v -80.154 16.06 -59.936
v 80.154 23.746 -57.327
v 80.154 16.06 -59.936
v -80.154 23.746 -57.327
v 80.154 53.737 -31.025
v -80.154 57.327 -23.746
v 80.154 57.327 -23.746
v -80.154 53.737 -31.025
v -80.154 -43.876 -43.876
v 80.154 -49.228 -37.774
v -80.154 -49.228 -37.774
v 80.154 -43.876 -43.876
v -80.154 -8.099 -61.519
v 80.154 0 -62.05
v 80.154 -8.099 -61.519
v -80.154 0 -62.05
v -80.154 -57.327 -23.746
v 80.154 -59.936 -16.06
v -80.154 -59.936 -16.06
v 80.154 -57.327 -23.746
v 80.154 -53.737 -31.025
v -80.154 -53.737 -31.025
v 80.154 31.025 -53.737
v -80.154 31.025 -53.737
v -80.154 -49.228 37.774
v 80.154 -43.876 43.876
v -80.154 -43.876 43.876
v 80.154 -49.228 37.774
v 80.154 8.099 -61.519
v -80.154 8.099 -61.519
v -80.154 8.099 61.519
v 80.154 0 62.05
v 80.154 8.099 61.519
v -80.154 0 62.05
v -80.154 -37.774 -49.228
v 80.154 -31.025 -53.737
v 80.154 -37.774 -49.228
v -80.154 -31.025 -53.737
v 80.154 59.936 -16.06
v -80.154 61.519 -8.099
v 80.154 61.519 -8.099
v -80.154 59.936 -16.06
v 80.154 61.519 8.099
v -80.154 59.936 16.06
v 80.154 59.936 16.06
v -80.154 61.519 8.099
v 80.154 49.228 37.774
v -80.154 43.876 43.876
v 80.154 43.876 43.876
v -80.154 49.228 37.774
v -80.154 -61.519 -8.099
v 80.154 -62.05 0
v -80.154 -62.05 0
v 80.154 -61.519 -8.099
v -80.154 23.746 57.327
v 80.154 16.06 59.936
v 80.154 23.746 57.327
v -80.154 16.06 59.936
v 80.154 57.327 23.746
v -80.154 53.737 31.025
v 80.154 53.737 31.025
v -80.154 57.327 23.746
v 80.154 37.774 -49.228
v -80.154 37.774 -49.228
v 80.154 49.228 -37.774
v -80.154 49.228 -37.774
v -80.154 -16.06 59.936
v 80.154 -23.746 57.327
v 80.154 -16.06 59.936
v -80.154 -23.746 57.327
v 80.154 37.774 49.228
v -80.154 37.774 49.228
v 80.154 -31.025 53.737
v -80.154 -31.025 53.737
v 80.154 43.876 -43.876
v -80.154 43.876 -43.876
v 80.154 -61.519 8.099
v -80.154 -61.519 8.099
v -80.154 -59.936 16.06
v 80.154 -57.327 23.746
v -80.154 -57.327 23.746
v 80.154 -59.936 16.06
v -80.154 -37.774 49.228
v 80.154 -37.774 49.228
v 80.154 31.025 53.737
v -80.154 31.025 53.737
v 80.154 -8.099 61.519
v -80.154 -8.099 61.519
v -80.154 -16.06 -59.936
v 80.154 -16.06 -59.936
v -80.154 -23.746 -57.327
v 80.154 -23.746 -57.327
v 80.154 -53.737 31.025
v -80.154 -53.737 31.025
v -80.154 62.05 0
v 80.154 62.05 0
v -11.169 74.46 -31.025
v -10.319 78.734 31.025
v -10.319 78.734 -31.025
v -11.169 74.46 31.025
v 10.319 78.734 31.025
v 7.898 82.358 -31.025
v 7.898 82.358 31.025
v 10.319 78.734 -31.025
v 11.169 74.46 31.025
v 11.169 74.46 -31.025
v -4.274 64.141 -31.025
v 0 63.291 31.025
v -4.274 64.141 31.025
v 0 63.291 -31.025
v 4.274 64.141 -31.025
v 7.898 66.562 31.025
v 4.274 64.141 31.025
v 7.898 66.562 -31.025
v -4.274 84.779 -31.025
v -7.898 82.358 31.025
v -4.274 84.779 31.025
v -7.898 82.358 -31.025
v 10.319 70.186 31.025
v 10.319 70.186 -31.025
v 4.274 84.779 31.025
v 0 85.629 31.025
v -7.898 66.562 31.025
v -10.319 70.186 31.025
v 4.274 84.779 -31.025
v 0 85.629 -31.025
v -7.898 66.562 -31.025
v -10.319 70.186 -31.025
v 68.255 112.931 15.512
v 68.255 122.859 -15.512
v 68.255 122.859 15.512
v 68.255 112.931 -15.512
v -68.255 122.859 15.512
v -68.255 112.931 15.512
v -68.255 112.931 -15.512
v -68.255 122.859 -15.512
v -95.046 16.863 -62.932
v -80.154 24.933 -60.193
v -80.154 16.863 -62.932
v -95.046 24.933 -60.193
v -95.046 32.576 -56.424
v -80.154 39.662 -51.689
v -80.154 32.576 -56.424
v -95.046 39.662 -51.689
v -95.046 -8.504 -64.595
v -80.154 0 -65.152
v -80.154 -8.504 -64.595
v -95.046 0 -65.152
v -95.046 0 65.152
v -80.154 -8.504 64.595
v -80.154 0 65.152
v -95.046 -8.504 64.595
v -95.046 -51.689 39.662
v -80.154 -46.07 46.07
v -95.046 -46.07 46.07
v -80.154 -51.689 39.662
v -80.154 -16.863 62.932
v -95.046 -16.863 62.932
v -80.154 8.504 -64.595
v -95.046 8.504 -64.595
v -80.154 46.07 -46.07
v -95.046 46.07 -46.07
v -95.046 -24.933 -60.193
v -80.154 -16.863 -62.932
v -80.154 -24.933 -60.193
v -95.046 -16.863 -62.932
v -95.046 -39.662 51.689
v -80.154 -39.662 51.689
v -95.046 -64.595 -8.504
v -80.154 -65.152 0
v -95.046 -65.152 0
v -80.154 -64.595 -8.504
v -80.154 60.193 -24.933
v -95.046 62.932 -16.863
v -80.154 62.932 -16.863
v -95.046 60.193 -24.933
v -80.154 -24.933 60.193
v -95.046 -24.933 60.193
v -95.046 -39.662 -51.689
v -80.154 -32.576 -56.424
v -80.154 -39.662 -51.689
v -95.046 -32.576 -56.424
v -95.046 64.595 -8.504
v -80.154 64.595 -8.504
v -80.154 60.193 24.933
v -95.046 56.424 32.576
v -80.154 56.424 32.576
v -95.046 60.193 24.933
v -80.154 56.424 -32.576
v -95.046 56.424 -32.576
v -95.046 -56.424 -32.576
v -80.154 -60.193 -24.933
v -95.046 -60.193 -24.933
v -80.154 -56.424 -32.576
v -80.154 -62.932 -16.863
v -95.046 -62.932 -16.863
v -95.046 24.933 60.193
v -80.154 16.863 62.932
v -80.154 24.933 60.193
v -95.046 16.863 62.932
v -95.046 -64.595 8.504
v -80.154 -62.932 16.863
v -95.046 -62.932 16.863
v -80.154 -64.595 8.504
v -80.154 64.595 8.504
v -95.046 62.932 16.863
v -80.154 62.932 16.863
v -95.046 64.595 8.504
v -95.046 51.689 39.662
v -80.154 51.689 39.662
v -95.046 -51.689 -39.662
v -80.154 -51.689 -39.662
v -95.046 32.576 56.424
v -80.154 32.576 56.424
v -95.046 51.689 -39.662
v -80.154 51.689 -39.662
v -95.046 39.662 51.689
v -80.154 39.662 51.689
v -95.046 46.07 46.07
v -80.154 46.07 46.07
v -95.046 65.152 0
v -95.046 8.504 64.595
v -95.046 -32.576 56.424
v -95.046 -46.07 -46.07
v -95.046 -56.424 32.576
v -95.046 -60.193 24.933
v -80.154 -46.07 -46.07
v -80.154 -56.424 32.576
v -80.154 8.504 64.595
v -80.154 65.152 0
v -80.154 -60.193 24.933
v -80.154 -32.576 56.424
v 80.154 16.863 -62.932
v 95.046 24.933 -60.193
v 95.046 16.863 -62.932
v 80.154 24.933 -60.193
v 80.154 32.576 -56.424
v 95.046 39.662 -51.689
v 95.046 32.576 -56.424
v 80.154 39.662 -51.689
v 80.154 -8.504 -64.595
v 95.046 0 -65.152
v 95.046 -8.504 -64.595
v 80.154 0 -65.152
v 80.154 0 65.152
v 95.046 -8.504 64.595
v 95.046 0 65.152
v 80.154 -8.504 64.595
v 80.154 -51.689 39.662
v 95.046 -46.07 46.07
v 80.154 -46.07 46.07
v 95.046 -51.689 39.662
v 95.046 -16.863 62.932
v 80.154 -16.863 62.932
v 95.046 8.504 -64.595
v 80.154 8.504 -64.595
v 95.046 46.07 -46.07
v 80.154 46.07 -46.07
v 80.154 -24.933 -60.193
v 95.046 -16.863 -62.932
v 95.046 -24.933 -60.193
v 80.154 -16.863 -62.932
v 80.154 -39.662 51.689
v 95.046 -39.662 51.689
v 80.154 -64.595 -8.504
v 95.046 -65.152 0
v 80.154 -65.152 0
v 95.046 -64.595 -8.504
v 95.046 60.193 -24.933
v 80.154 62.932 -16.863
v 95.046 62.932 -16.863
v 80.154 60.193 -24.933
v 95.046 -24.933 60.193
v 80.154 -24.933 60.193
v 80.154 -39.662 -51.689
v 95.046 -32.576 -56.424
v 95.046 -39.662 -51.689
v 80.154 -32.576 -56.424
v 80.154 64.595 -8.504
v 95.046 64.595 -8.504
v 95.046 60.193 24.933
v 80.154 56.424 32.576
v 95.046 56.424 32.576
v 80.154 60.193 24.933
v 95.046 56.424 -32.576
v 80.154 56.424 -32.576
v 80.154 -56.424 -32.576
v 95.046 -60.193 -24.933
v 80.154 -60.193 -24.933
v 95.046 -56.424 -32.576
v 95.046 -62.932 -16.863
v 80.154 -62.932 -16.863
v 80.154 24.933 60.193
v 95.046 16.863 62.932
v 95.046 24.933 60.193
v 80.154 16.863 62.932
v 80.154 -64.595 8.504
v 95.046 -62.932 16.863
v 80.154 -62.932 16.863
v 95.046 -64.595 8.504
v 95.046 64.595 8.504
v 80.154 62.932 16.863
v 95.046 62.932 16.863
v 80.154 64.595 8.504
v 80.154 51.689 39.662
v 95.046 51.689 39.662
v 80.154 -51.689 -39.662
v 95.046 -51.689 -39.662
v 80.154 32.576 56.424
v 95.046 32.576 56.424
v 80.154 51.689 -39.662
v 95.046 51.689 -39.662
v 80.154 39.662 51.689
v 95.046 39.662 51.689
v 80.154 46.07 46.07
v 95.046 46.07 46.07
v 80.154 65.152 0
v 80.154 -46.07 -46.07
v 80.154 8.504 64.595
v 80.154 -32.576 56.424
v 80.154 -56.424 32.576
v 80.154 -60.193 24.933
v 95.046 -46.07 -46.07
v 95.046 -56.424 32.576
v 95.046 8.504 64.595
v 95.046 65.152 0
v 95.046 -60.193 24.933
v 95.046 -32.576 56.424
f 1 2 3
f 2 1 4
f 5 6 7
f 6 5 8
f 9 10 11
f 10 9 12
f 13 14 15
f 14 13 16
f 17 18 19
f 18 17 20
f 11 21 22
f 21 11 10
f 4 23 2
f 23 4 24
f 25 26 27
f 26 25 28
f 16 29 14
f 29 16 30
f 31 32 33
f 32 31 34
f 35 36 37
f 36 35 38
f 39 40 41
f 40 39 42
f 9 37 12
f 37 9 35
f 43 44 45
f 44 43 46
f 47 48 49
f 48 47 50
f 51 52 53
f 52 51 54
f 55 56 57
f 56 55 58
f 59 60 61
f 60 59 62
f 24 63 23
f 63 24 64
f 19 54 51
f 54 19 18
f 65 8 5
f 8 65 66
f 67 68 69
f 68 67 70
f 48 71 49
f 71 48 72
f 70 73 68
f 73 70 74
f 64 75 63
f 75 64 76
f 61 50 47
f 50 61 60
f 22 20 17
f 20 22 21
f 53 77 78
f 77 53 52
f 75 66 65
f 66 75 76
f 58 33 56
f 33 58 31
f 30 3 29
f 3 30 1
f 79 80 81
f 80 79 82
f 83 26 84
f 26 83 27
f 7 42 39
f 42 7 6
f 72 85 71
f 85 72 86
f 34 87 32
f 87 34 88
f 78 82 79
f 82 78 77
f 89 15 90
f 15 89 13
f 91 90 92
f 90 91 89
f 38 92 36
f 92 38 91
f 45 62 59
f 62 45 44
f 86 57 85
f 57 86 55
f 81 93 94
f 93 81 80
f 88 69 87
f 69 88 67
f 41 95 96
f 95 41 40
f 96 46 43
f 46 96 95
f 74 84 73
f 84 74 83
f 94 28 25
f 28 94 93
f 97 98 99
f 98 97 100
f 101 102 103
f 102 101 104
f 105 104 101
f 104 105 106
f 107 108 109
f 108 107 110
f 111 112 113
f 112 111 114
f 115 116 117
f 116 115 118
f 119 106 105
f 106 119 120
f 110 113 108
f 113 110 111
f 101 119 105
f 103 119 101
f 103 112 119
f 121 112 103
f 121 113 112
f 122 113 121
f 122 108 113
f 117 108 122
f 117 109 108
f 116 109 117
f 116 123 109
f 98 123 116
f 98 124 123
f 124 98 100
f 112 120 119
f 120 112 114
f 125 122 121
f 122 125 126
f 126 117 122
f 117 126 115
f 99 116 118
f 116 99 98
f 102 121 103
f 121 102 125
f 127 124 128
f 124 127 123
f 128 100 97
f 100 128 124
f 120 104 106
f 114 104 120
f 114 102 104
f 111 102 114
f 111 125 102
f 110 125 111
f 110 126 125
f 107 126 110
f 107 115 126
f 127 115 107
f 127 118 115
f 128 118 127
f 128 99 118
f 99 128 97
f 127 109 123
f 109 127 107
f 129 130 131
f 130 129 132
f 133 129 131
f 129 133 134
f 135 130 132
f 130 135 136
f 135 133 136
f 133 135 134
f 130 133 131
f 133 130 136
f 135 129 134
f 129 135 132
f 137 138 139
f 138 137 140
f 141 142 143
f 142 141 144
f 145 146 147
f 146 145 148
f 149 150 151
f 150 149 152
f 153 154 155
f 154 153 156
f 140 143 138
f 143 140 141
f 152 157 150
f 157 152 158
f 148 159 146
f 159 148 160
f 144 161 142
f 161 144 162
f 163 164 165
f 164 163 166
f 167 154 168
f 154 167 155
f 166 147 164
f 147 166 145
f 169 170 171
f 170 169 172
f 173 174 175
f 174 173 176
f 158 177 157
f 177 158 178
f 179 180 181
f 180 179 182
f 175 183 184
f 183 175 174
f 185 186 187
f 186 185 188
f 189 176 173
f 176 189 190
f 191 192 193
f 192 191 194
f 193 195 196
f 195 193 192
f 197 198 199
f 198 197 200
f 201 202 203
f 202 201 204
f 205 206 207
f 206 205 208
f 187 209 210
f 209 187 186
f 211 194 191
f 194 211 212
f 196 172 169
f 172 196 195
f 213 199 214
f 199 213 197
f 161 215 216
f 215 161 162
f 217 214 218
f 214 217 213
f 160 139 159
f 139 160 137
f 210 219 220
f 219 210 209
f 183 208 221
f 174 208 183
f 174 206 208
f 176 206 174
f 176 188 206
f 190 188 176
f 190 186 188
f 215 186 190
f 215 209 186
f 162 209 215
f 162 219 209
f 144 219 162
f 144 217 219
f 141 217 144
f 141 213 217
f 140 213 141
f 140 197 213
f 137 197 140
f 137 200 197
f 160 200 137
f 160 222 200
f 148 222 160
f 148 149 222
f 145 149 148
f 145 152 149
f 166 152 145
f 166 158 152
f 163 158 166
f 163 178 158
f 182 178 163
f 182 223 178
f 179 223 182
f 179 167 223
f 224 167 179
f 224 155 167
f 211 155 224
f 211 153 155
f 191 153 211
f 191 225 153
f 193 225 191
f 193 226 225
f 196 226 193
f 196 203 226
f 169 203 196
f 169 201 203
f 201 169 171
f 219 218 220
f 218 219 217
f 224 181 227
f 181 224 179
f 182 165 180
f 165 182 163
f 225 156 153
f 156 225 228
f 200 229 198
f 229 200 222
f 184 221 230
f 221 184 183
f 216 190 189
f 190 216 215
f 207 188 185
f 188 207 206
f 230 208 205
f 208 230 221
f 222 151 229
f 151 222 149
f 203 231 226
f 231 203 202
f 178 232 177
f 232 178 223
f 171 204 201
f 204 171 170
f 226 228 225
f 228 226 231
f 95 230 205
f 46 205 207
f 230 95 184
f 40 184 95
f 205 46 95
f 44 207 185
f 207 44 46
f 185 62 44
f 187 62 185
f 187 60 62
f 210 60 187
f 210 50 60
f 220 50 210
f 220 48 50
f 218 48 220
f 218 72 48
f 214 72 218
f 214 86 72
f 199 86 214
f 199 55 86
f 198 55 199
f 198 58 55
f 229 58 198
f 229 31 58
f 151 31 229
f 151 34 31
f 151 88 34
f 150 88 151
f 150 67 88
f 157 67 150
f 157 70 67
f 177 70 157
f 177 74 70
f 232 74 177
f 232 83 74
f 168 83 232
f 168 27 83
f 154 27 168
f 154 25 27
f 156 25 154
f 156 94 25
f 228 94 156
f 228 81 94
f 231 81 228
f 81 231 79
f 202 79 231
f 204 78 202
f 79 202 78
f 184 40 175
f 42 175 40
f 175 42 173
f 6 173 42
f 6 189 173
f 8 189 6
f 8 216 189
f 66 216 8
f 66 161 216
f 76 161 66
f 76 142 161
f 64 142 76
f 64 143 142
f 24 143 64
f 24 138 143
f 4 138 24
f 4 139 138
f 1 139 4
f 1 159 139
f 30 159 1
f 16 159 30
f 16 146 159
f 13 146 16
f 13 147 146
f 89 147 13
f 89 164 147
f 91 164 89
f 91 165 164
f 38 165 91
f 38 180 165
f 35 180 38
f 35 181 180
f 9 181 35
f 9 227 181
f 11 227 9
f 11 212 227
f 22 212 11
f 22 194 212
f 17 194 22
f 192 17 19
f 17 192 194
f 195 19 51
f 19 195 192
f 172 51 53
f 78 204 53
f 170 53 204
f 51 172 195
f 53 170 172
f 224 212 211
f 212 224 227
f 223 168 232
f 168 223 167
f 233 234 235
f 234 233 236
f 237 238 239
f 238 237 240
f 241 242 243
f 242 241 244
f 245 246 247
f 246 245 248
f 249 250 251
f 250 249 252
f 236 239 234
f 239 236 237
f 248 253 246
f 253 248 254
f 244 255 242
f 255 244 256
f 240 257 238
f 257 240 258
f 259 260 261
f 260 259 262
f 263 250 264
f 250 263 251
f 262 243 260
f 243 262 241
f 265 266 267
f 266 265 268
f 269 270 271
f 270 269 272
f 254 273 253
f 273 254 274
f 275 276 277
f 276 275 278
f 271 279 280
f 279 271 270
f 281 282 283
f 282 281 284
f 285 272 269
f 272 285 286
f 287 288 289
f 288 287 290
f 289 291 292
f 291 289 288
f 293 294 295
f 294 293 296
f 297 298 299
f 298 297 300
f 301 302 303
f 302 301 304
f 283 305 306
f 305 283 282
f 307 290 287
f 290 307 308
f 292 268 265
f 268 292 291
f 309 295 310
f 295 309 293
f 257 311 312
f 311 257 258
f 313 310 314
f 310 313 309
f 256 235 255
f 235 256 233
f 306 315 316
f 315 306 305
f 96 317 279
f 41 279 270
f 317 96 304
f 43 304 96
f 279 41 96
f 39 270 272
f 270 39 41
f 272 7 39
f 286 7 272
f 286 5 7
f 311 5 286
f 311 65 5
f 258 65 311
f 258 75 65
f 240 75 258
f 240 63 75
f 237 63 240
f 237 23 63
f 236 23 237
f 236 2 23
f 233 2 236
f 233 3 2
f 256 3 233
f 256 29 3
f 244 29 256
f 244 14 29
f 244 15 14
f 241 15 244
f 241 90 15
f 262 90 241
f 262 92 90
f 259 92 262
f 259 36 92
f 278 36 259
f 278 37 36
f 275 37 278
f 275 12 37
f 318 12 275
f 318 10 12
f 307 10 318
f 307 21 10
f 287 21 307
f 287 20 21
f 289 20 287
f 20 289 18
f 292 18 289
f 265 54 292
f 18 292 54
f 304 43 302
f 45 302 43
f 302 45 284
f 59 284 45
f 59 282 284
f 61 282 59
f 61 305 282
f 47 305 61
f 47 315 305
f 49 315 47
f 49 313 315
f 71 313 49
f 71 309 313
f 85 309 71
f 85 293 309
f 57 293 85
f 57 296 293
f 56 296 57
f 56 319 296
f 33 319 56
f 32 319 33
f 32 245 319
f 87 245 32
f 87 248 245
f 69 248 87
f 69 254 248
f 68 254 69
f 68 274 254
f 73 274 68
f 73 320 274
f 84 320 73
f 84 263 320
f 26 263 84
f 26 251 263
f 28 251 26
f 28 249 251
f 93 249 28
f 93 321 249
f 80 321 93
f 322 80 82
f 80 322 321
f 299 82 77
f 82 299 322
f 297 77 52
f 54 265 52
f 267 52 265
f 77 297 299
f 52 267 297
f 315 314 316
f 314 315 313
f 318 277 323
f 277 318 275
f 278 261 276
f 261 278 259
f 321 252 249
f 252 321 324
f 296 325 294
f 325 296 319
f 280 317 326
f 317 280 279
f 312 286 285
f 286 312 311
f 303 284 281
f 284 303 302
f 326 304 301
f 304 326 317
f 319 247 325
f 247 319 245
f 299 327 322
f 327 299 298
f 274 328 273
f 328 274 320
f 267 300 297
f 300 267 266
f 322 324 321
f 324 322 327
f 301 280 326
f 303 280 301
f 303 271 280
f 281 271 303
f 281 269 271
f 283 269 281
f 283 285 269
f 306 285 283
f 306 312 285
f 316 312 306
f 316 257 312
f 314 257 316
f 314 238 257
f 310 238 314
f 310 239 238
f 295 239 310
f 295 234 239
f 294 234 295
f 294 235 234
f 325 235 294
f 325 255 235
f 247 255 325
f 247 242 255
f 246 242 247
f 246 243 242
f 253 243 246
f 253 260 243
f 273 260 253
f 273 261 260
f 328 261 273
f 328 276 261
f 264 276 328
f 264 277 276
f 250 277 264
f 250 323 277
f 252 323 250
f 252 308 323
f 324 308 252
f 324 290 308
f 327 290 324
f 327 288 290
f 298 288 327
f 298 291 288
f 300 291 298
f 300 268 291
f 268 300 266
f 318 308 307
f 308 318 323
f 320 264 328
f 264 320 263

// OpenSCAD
// Auto-generated by scripts/author_from_manifest.py (Phase D.3).
// Source: data/phase_d_manifest.json (sku_intent='tyco-av1-300-alarm-check-2.5in').
// Do not hand-edit — regenerate from the manifest.
//
// @part tyco_av1_300_alarm_check_2_5in
// @kind valve
// @category valve.alarm.check
// @display-name "Tyco AV-1-300 Alarm Check Valve 2.5\" (300 psi)"
// @mfg tyco_fire_protection
// @mfg-pn AV-1-300
// @listing UL FM
// @price-usd 480.00
// @install-minutes 45
// @crew foreman
// @param size_in number default=2.5 label="Size" unit="in"
// @port inlet position=[-0.05,0,0] direction=[-1,0,0] style=grooved size_in=2.5 role=run_a
// @port outlet position=[0.05,0,0] direction=[1,0,0] style=grooved size_in=2.5 role=run_b

size_in = 2.5;

function od_mm(nps) =
    nps ==   1  ? 33.4 :
    nps == 1.25 ? 42.2 :
    nps == 1.5  ? 48.3 :
    nps ==   2  ? 60.3 :
    nps == 2.5  ? 73.0 :
    nps ==   3  ? 88.9 :
    nps ==   4  ? 114.3 :
    nps ==   6  ? 168.3 :
    nps ==   8  ? 219.1 : 73.0;

od = od_mm(size_in);
body_len = od * 2.4;
body_d   = od * 1.7;

union() {
    // Valve body
    rotate([0, 90, 0])
        cylinder(h = body_len, d = body_d, center = true, $fn = 48);
    // Stem / handle indicator
    translate([0, body_d * 0.6, 0])
        cylinder(h = body_d * 0.5, d = body_d * 0.18, center = true, $fn = 16);
    translate([0, body_d * 0.95, 0])
        cube([body_d * 1.1, body_d * 0.08, body_d * 0.25], center = true);
    // End flanges
    translate([-body_len/2, 0, 0])
        rotate([0, 90, 0])
        cylinder(h = body_d * 0.12, d = body_d * 1.05, center = true, $fn = 48);
    translate([ body_len/2, 0, 0])
        rotate([0, 90, 0])
        cylinder(h = body_d * 0.12, d = body_d * 1.05, center = true, $fn = 48);
}
